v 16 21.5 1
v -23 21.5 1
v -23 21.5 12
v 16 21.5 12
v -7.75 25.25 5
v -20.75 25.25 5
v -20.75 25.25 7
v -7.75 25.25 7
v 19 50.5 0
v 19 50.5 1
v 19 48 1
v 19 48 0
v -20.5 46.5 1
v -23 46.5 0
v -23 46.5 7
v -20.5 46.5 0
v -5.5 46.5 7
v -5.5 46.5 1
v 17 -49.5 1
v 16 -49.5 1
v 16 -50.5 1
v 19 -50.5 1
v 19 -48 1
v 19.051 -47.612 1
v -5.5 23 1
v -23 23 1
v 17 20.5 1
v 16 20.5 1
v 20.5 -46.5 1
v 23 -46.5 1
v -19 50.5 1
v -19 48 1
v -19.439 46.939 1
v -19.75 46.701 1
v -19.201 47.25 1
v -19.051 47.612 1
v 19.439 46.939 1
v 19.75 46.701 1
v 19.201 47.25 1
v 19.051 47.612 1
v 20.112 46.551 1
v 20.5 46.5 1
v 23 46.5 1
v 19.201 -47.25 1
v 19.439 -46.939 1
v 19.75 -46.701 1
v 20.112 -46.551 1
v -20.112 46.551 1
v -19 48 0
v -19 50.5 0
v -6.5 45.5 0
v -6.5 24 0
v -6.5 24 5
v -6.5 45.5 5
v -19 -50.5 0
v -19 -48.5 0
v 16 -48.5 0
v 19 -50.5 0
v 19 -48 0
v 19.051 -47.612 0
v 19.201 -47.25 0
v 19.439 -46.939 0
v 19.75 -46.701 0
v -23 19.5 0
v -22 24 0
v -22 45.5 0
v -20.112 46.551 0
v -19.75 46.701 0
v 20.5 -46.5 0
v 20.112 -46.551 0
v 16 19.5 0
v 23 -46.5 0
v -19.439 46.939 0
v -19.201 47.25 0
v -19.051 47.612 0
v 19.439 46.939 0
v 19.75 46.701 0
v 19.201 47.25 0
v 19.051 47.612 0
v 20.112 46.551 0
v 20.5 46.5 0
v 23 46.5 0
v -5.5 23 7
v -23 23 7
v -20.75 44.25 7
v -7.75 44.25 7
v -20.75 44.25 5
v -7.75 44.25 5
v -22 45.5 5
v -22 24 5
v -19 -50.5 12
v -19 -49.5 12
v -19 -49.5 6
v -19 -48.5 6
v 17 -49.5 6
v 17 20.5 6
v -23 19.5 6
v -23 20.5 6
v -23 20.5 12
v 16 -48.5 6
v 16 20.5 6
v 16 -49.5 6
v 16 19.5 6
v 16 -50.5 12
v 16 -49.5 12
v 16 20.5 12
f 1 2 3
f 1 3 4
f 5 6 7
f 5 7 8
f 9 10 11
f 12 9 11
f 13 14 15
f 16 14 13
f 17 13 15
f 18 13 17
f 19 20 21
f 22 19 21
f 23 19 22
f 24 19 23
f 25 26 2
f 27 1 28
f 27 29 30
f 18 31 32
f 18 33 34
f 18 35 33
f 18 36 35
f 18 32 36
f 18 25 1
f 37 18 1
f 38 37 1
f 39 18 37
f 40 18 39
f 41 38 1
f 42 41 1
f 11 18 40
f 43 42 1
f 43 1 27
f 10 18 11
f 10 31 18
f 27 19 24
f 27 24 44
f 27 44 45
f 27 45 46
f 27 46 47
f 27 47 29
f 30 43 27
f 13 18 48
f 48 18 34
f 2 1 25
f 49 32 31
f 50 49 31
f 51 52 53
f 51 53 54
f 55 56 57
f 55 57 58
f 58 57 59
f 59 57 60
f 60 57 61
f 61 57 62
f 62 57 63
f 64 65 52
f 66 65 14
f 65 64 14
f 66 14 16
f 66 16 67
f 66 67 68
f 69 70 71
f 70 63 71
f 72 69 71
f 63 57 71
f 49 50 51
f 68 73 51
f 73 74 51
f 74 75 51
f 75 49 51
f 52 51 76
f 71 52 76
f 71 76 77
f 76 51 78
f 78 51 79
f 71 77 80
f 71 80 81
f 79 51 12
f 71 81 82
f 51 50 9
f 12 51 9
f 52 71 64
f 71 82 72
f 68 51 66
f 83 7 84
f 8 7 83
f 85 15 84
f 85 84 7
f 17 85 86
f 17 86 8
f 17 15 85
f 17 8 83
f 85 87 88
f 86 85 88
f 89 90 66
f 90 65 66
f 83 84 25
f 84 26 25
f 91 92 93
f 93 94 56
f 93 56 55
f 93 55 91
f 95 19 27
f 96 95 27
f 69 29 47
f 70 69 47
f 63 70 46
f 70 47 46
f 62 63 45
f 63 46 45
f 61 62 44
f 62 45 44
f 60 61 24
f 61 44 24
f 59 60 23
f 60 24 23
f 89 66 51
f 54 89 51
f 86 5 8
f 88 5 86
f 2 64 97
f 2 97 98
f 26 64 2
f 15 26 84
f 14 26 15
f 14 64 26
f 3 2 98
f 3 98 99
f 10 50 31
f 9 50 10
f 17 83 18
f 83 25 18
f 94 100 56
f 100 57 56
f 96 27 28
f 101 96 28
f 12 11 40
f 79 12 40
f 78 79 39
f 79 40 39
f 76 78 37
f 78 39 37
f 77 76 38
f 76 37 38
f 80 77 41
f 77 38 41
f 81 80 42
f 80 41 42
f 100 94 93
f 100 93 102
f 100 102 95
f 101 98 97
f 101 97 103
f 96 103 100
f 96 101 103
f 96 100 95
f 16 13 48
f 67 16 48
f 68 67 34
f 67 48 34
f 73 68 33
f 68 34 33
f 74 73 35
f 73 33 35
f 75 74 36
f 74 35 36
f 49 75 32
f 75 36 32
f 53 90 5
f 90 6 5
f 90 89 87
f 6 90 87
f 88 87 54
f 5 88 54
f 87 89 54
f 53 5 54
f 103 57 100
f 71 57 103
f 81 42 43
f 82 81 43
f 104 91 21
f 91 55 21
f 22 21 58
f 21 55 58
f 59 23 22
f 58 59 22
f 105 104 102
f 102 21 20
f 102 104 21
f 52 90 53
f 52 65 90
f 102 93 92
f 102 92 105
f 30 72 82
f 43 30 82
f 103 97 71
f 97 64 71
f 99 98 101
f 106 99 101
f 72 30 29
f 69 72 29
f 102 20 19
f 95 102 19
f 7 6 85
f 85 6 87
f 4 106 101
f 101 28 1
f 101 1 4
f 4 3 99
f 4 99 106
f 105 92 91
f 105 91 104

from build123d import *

# Parameters (mm, degrees)
F2_W      = 46
F2_H      = 101
F3_DEPTH  = 1
F5_DEPTH  = 1
F6_W      = 39
F6_H      = 68
F7_DEPTH  = 1
F8_W      = 39
F8_H      = 1
F8_W_2    = 35
F9_DEPTH  = 11
F10_W     = 1
F10_H     = 68
F11_DEPTH = 5
F12_W     = 17.5
F12_H     = 23.5
F12_W_2   = 15.5
F12_H_2   = 21.5
F13_DEPTH = 4
F14_W     = 15.5
F14_H     = 21.5
F15_DEPTH = 1
F16_W     = 17.5
F16_H     = 23.5
F16_W_2   = 13
F16_H_2   = 19
F17_DEPTH = 2


with BuildPart() as f3:
    # F2 (on Top) → F3 (new body)
    with BuildSketch(Plane.XY):
        Rectangle(F2_W, F2_H)
    extrude(amount=F3_DEPTH)

    # F4 (on face) → F5 (cut, through all)
    with BuildSketch(Plane.XY.offset(1)):
        with BuildLine():
            Line((-19, 50.5), (-23, 50.5))
            Line((-23, 50.5), (-23, 46.5))
            Line((-23, 46.5), (-20.5, 46.5))
            ThreePointArc((-20.5, 46.5), (-19.4393398282, 46.9393398282), (-19, 48))
            Line((-19, 48), (-19, 50.5))
        make_face()
        with BuildLine():
            Line((23, 46.5), (23, 50.5))
            Line((23, 50.5), (19, 50.5))
            Line((19, 50.5), (19, 48))
            ThreePointArc((19, 48), (19.4393398282, 46.9393398282), (20.5, 46.5))
            Line((20.5, 46.5), (23, 46.5))
        make_face()
        with BuildLine():
            Line((23, -46.5), (20.5, -46.5))
            ThreePointArc((20.5, -46.5), (19.4393398282, -46.9393398282), (19, -48))
            Line((19, -48), (19, -50.5))
            Line((19, -50.5), (23, -50.5))
            Line((23, -50.5), (23, -46.5))
        make_face()
        with BuildLine():
            ThreePointArc((-19, -48), (-19.4393398282, -46.9393398282), (-20.5, -46.5))
            Line((-20.5, -46.5), (-23, -46.5))
            Line((-23, -46.5), (-23, -50.5))
            Line((-23, -50.5), (-19, -50.5))
            Line((-19, -50.5), (-19, -48))
        make_face()
    extrude(amount=-F5_DEPTH, mode=Mode.SUBTRACT)

    # F6 (on face) → F7 (cut, through all)
    with BuildSketch(Plane.XY.offset(1)):
        with Locations((-3.5, -14.5)):
            Rectangle(F6_W, F6_H)
    extrude(amount=-F7_DEPTH, mode=Mode.SUBTRACT)

    # F8 (on face) → F9 (join)
    with BuildSketch(Plane.XY.offset(1)):
        with Locations((-3.5, 21)):
            Rectangle(F8_W, F8_H)
        with Locations((-1.5, -50)):
            Rectangle(F8_W_2, F8_H)
    extrude(amount=F9_DEPTH)

    # F10 (on face) → F11 (join)
    with BuildSketch(Plane.XY.offset(1)):
        Polygon((-23, 20.5), (-23, 19.5), (16, 19.5), (17, 19.5), (17, 20.5), align=None)
        with Locations((16.5, -14.5)):
            Rectangle(F10_W, F10_H)
        Polygon((17, -48.5), (16, -48.5), (-19, -48.5), (-19, -49.5), (17, -49.5), align=None)
    extrude(amount=F11_DEPTH)

    # F12 (on face) → F13 (join)
    with BuildSketch(Plane.XY.offset(1)):
        with Locations((-14.25, 34.75)):
            Rectangle(F12_W, F12_H)
        with Locations((-14.25, 34.75)):
            Rectangle(F12_W_2, F12_H_2, mode=Mode.SUBTRACT)
    extrude(amount=F13_DEPTH)

    # F14 (on face) → F15 (cut, through all)
    with BuildSketch(Plane.XY.offset(1)):
        with Locations((-14.25, 34.75)):
            Rectangle(F14_W, F14_H)
    extrude(amount=-F15_DEPTH, mode=Mode.SUBTRACT)

    # F16 (on face) → F17 (join)
    with BuildSketch(Plane.XY.offset(5)):
        with Locations((-14.25, 34.75)):
            Rectangle(F16_W, F16_H)
        with Locations((-14.25, 34.75)):
            Rectangle(F16_W_2, F16_H_2, mode=Mode.SUBTRACT)
    extrude(amount=F17_DEPTH)


solid = f3.part
